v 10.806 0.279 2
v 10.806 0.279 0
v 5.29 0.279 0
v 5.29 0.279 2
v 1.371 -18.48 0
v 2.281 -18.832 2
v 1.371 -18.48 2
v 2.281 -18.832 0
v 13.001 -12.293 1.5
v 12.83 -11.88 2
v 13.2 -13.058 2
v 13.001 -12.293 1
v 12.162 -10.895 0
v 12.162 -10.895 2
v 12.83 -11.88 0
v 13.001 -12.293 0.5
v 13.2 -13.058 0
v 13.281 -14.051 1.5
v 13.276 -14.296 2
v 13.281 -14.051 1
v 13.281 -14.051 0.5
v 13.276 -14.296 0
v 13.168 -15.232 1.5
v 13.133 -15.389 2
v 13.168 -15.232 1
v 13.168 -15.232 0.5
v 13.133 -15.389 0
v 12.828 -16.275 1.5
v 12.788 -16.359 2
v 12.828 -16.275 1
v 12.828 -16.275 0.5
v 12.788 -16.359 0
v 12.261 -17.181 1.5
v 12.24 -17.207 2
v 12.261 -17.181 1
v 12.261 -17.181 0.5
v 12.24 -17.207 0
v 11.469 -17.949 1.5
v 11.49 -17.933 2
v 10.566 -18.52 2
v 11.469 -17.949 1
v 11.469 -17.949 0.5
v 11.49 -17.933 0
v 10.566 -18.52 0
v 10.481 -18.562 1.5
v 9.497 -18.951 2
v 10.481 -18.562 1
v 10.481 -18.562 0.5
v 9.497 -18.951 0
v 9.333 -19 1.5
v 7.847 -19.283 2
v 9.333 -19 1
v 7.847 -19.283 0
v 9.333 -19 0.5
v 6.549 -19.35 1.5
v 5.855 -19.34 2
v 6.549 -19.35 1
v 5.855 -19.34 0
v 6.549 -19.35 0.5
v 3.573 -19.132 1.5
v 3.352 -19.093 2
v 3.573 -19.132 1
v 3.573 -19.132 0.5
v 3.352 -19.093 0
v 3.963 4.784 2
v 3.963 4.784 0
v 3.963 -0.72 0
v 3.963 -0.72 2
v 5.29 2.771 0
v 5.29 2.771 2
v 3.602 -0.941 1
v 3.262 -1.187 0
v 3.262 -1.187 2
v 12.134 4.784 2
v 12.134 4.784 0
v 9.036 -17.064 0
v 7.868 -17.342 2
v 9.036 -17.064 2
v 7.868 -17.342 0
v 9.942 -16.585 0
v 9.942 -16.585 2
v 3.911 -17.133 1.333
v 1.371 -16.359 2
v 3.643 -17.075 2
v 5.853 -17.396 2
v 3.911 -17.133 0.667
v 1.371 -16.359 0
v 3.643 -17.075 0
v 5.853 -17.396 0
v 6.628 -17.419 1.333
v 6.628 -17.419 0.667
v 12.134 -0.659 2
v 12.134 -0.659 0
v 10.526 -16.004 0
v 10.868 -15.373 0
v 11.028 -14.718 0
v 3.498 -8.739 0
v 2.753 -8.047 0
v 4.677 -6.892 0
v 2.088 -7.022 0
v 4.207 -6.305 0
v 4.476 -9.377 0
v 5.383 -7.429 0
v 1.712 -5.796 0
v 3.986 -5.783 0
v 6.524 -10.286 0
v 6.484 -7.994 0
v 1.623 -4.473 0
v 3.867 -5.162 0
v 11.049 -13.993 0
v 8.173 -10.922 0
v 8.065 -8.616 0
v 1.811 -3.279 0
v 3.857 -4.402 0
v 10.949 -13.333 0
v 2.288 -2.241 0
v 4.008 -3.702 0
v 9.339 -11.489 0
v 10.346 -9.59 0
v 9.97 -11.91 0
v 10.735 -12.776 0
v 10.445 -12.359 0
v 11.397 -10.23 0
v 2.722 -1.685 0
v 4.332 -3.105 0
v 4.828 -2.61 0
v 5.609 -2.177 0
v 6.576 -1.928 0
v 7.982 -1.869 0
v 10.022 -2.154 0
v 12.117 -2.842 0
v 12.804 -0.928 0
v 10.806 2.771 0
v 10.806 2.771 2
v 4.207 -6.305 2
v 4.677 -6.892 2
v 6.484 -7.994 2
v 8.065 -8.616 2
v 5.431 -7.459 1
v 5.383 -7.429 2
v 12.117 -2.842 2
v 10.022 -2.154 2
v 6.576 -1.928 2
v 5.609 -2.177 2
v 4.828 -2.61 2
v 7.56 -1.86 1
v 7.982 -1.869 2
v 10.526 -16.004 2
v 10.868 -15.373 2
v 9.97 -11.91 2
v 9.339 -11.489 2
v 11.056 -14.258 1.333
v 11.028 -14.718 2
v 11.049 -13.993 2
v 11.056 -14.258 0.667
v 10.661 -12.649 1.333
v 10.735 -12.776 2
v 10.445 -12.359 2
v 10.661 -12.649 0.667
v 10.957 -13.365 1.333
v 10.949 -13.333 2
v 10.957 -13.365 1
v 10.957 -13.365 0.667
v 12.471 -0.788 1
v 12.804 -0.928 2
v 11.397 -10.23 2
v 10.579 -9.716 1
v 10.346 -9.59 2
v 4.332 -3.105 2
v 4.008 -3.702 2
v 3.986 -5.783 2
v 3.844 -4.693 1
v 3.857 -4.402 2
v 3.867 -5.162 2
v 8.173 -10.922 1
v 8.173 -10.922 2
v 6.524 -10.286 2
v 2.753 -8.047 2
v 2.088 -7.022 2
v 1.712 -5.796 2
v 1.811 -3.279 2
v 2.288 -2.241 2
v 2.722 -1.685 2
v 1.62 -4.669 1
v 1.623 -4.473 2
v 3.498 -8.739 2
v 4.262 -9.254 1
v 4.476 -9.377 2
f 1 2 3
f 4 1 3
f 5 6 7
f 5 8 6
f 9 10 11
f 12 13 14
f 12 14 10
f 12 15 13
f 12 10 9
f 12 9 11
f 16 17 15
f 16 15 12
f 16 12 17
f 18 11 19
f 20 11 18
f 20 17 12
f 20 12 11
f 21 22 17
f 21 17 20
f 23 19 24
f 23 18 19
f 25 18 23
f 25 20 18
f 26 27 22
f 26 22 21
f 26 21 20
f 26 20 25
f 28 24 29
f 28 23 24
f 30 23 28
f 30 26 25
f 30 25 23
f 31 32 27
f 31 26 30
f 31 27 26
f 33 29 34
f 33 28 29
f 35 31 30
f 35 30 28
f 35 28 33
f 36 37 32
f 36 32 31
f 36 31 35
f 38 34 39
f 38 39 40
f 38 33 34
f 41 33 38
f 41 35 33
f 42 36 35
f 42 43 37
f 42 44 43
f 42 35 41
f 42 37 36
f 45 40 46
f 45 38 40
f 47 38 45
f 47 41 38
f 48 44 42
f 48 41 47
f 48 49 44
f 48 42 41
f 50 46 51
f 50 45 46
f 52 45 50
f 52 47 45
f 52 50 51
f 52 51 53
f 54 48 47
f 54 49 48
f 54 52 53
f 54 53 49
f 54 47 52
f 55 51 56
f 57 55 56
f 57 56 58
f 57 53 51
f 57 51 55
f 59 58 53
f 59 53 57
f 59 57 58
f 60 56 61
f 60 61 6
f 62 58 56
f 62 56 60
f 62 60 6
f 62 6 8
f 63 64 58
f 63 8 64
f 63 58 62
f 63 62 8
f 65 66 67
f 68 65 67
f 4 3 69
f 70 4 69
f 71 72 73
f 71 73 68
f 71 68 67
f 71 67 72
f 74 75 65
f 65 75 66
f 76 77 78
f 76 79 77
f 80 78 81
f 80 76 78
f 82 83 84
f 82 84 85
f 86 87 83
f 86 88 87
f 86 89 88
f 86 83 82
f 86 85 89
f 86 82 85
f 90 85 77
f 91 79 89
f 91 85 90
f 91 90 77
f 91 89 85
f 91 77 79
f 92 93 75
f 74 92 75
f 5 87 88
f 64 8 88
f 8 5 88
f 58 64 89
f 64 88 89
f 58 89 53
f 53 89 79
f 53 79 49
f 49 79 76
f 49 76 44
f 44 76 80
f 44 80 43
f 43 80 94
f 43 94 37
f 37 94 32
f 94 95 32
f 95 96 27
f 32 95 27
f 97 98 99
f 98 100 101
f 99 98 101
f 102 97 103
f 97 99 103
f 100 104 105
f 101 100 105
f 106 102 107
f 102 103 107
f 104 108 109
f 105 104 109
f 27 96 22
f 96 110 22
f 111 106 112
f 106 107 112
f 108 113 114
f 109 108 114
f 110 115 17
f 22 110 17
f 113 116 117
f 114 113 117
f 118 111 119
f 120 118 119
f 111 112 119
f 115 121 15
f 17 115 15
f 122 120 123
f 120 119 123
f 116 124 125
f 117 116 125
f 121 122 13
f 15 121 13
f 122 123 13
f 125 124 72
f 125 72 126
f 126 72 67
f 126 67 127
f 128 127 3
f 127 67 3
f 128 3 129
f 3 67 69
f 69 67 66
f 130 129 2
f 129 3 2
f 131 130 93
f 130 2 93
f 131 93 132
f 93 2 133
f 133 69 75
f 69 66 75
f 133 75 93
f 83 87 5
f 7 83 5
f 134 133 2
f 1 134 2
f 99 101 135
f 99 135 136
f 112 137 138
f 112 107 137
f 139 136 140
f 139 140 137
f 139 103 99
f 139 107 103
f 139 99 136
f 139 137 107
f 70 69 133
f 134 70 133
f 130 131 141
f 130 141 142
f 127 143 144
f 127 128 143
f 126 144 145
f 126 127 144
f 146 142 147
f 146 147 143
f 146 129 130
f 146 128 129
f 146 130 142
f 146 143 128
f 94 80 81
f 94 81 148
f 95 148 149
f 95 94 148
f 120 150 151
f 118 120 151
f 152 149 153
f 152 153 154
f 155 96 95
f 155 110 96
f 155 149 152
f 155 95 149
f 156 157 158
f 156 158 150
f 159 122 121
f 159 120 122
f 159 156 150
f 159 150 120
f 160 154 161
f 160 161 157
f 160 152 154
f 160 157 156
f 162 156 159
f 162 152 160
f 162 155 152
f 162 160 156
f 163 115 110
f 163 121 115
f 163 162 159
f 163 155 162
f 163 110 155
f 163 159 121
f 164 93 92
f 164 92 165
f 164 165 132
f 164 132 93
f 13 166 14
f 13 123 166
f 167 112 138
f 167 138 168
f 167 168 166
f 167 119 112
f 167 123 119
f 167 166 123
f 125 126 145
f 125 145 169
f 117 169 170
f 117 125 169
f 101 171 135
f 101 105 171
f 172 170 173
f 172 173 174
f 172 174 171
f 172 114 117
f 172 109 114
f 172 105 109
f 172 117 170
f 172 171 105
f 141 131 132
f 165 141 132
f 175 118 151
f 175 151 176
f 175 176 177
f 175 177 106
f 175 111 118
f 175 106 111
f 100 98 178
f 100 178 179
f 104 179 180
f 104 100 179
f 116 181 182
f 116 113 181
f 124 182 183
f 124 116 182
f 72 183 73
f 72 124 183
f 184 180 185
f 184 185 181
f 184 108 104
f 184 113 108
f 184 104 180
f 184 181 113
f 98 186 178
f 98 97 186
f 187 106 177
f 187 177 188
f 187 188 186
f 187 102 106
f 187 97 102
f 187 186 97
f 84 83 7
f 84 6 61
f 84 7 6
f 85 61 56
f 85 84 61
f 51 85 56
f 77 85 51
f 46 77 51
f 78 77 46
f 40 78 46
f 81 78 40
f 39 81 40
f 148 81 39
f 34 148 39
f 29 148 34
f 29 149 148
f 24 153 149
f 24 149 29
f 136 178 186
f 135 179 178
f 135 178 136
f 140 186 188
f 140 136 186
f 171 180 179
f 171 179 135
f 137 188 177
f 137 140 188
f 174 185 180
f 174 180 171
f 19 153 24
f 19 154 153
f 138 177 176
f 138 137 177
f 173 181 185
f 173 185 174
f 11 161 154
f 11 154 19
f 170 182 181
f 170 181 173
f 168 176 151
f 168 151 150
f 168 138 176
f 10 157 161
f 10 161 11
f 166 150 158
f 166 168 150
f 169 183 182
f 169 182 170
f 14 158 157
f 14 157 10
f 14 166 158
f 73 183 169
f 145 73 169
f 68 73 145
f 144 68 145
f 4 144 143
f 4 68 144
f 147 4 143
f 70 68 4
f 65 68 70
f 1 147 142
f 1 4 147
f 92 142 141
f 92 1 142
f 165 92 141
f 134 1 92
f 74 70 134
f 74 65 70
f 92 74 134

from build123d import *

# Parameters (mm, degrees)
F1_DEPTH = 2


# Not quite as in the source:
# - a feature names something its author has since deleted; it is built from what else it names


with BuildPart() as f1:
    # F0 (on Top) → F1 (new body)
    with BuildSketch(Plane.XY):
        with BuildLine():
            Line((12.1336504817, -0.6587872652), (12.1336504817, -1.7344431253))
            Line((12.1336504817, -1.7344431253), (8.0481928308, -1.7344431253))
            Line((8.0481928308, -1.7344431253), (3.9627351798, -1.7344431253))
            Line((3.9627351798, -1.7344431253), (3.9627351798, -0.7203246705))
            add(Edge.make_bspline(
                [(3.2622219629, -1.1868274189), (3.5910961238, -0.9276264724), (3.9627351798, -0.7203246705)],
                knots=[0, 0, 0, 0.2002274501, 0.2002274501, 0.2002274501], degree=2))
            add(Edge.make_bspline(
                [(1.6197190952, -4.668602098), (1.6197190952, -2.4813599438), (3.2622219629, -1.1868274189)],
                knots=[0, 0, 0, 1, 1, 1], degree=2))
            add(Edge.make_bspline(
                [(2.7526939611, -8.0468141751), (1.6197190952, -6.7522816502), (1.6197190952, -4.668602098)],
                knots=[0, 0, 0, 1, 1, 1], degree=2))
            add(Edge.make_bspline(
                [(6.5244439258, -10.2858376303), (3.8856688269, -9.3413467001), (2.7526939611, -8.0468141751)],
                knots=[0, 0, 0, 1, 1, 1], degree=2))
            add(Edge.make_bspline(
                [(9.339275448, -11.4892350655), (8.4134257862, -10.9569232912), (6.5244439258, -10.2858376303)],
                knots=[0, 0, 0, 1, 1, 1], degree=2))
            add(Edge.make_bspline(
                [(10.6607342495, -12.6491362079), (10.2651251099, -12.0215468398), (9.339275448, -11.4892350655)],
                knots=[0, 0, 0, 1, 1, 1], degree=2))
            add(Edge.make_bspline(
                [(11.0563433891, -14.2584990429), (11.0563433891, -13.276725576), (10.6607342495, -12.6491362079)],
                knots=[0, 0, 0, 1, 1, 1], degree=2))
            add(Edge.make_bspline(
                [(9.9420097917, -16.5845150837), (11.0563433891, -15.7498005116), (11.0563433891, -14.2584990429)],
                knots=[0, 0, 0, 1, 1, 1], degree=2))
            add(Edge.make_bspline(
                [(6.6280065278, -17.4192296558), (8.8276761942, -17.4192296558), (9.9420097917, -16.5845150837)],
                knots=[0, 0, 0, 1, 1, 1], degree=2))
            add(Edge.make_bspline(
                [(3.9105238514, -17.1333968743), (5.2816927018, -17.4192296558), (6.6280065278, -17.4192296558)],
                knots=[0, 0, 0, 1, 1, 1], degree=2))
            add(Edge.make_bspline(
                [(1.3711688504, -16.3587486114), (2.539355001, -16.8475640928), (3.9105238514, -17.1333968743)],
                knots=[0, 0, 0, 1, 1, 1], degree=2))
            Line((1.3711688504, -16.3587486114), (1.3711688504, -18.4797107003))
            add(Edge.make_bspline(
                [(6.5492989503, -19.349636557), (3.1855856374, -19.349636557), (1.3711688504, -18.4797107003)],
                knots=[0, 0, 0, 1, 1, 1], degree=2))
            add(Edge.make_bspline(
                [(11.4685225451, -17.949470178), (9.6561770102, -19.349636557), (6.5492989503, -19.349636557)],
                knots=[0, 0, 0, 1, 1, 1], degree=2))
            add(Edge.make_bspline(
                [(13.28086808, -14.0513738389), (13.28086808, -16.549303799), (11.4685225451, -17.949470178)],
                knots=[0, 0, 0, 1, 1, 1], degree=2))
            add(Edge.make_bspline(
                [(12.1623919785, -10.89478573), (13.28086808, -12.1126819295), (13.28086808, -14.0513738389)],
                knots=[0, 0, 0, 1, 1, 1], degree=2))
            add(Edge.make_bspline(
                [(8.0654554435, -8.6164084861), (11.0439158769, -9.6768895306), (12.1623919785, -10.89478573)],
                knots=[0, 0, 0, 1, 1, 1], degree=2))
            add(Edge.make_bspline(
                [(5.4308228487, -7.4585785958), (6.2924636973, -7.9826053619), (8.0654554435, -8.6164084861)],
                knots=[0, 0, 0, 1, 1, 1], degree=2))
            add(Edge.make_bspline(
                [(4.2067128931, -6.3048912095), (4.5691820001, -6.9345518297), (5.4308228487, -7.4585785958)],
                knots=[0, 0, 0, 1, 1, 1], degree=2))
            add(Edge.make_bspline(
                [(3.8442437861, -4.6934571225), (3.8442437861, -5.6752305894), (4.2067128931, -6.3048912095)],
                knots=[0, 0, 0, 1, 1, 1], degree=2))
            add(Edge.make_bspline(
                [(4.8280885051, -2.6097775703), (3.8442437861, -3.3595708088), (3.8442437861, -4.6934571225)],
                knots=[0, 0, 0, 1, 1, 1], degree=2))
            add(Edge.make_bspline(
                [(7.5600699457, -1.8599843319), (5.811933224, -1.8599843319), (4.8280885051, -2.6097775703)],
                knots=[0, 0, 0, 1, 1, 1], degree=2))
            add(Edge.make_bspline(
                [(12.1168244336, -2.8417577988), (9.7721671244, -1.8599843319), (7.5600699457, -1.8599843319)],
                knots=[0, 0, 0, 1, 1, 1], degree=2))
            Line((12.1168244336, -2.8417577988), (12.8044801109, -0.9279209139))
            add(Edge.make_bspline(
                [(12.1336504817, -0.6587872652), (12.4734710603, -0.7832491261), (12.8044801109, -0.9279209139)],
                knots=[0.8603049894, 0.8603049894, 0.8603049894, 1, 1, 1], degree=2))
        make_face()
        with BuildLine():
            Line((8.0481928308, -1.7344431253), (12.1336504817, -1.7344431253))
            Line((12.1336504817, -1.7344431253), (12.1336504817, -0.6587872652))
            add(Edge.make_bspline(
                [(8.0481928308, 0.1014929313), (10.2292854005, 0.0387008703), (12.1336504817, -0.6587872652)],
                knots=[0.0774498097, 0.0774498097, 0.0774498097, 0.8603049894, 0.8603049894, 0.8603049894], degree=2))
            Line((8.0481928308, 0.1014929313), (8.0481928308, -1.7344431253))
        make_face()
        with BuildLine():
            Line((3.9627351798, -1.7344431253), (8.0481928308, -1.7344431253))
            Line((8.0481928308, -1.7344431253), (8.0481928308, 0.1014929313))
            add(Edge.make_bspline(
                [(7.6139224988, 0.1077051061), (7.8324119189, 0.1077051061), (8.0481928308, 0.1014929313)],
                knots=[0, 0, 0, 0.0774498097, 0.0774498097, 0.0774498097], degree=2))
            add(Edge.make_bspline(
                [(3.9627351798, -0.7203246705), (5.4471805714, 0.1077051061), (7.6139224988, 0.1077051061)],
                knots=[0.2002274501, 0.2002274501, 0.2002274501, 1, 1, 1], degree=2))
            Line((3.9627351798, -0.7203246705), (3.9627351798, -1.7344431253))
        make_face()
        with BuildLine():
            add(Edge.make_bspline(
                [(8.0481928308, 0.1014929313), (10.2292854005, 0.0387008703), (12.1336504817, -0.6587872652)],
                knots=[0.0774498097, 0.0774498097, 0.0774498097, 0.8603049894, 0.8603049894, 0.8603049894], degree=2))
            Line((12.1336504817, -0.6587872652), (12.1336504817, 3.1816535629))
            Line((12.1336504817, 3.1816535629), (12.1336504817, 4.784271121))
            Line((12.1336504817, 4.784271121), (8.0481928308, 4.784271121))
            Line((8.0481928308, 4.784271121), (8.0481928308, 2.7708526759))
            Line((8.0481928308, 2.7708526759), (10.8064850792, 2.7708526759))
            Line((10.8064850792, 2.7708526759), (10.8064850792, 0.2789753198))
            Line((10.8064850792, 0.2789753198), (8.0481928308, 0.2789753198))
            Line((8.0481928308, 0.2789753198), (8.0481928308, 0.1014929313))
        make_face()
        with BuildLine():
            add(Edge.make_bspline(
                [(7.6139224988, 0.1077051061), (7.8324119189, 0.1077051061), (8.0481928308, 0.1014929313)],
                knots=[0, 0, 0, 0.0774498097, 0.0774498097, 0.0774498097], degree=2))
            Line((8.0481928308, 0.1014929313), (8.0481928308, 0.2789753198))
            Line((8.0481928308, 0.2789753198), (5.2899005823, 0.2789753198))
            Line((5.2899005823, 0.2789753198), (5.2899005823, 2.7708526759))
            Line((5.2899005823, 2.7708526759), (8.0481928308, 2.7708526759))
            Line((8.0481928308, 2.7708526759), (8.0481928308, 4.784271121))
            Line((8.0481928308, 4.784271121), (3.9627351798, 4.784271121))
            Line((3.9627351798, 4.784271121), (3.9627351798, 3.1816535629))
            Line((3.9627351798, 3.1816535629), (3.9627351798, -0.7203246705))
            add(Edge.make_bspline(
                [(3.9627351798, -0.7203246705), (5.4471805714, 0.1077051061), (7.6139224988, 0.1077051061)],
                knots=[0.2002274501, 0.2002274501, 0.2002274501, 1, 1, 1], degree=2))
        make_face()
    extrude(amount=F1_DEPTH)


solid = f1.part
